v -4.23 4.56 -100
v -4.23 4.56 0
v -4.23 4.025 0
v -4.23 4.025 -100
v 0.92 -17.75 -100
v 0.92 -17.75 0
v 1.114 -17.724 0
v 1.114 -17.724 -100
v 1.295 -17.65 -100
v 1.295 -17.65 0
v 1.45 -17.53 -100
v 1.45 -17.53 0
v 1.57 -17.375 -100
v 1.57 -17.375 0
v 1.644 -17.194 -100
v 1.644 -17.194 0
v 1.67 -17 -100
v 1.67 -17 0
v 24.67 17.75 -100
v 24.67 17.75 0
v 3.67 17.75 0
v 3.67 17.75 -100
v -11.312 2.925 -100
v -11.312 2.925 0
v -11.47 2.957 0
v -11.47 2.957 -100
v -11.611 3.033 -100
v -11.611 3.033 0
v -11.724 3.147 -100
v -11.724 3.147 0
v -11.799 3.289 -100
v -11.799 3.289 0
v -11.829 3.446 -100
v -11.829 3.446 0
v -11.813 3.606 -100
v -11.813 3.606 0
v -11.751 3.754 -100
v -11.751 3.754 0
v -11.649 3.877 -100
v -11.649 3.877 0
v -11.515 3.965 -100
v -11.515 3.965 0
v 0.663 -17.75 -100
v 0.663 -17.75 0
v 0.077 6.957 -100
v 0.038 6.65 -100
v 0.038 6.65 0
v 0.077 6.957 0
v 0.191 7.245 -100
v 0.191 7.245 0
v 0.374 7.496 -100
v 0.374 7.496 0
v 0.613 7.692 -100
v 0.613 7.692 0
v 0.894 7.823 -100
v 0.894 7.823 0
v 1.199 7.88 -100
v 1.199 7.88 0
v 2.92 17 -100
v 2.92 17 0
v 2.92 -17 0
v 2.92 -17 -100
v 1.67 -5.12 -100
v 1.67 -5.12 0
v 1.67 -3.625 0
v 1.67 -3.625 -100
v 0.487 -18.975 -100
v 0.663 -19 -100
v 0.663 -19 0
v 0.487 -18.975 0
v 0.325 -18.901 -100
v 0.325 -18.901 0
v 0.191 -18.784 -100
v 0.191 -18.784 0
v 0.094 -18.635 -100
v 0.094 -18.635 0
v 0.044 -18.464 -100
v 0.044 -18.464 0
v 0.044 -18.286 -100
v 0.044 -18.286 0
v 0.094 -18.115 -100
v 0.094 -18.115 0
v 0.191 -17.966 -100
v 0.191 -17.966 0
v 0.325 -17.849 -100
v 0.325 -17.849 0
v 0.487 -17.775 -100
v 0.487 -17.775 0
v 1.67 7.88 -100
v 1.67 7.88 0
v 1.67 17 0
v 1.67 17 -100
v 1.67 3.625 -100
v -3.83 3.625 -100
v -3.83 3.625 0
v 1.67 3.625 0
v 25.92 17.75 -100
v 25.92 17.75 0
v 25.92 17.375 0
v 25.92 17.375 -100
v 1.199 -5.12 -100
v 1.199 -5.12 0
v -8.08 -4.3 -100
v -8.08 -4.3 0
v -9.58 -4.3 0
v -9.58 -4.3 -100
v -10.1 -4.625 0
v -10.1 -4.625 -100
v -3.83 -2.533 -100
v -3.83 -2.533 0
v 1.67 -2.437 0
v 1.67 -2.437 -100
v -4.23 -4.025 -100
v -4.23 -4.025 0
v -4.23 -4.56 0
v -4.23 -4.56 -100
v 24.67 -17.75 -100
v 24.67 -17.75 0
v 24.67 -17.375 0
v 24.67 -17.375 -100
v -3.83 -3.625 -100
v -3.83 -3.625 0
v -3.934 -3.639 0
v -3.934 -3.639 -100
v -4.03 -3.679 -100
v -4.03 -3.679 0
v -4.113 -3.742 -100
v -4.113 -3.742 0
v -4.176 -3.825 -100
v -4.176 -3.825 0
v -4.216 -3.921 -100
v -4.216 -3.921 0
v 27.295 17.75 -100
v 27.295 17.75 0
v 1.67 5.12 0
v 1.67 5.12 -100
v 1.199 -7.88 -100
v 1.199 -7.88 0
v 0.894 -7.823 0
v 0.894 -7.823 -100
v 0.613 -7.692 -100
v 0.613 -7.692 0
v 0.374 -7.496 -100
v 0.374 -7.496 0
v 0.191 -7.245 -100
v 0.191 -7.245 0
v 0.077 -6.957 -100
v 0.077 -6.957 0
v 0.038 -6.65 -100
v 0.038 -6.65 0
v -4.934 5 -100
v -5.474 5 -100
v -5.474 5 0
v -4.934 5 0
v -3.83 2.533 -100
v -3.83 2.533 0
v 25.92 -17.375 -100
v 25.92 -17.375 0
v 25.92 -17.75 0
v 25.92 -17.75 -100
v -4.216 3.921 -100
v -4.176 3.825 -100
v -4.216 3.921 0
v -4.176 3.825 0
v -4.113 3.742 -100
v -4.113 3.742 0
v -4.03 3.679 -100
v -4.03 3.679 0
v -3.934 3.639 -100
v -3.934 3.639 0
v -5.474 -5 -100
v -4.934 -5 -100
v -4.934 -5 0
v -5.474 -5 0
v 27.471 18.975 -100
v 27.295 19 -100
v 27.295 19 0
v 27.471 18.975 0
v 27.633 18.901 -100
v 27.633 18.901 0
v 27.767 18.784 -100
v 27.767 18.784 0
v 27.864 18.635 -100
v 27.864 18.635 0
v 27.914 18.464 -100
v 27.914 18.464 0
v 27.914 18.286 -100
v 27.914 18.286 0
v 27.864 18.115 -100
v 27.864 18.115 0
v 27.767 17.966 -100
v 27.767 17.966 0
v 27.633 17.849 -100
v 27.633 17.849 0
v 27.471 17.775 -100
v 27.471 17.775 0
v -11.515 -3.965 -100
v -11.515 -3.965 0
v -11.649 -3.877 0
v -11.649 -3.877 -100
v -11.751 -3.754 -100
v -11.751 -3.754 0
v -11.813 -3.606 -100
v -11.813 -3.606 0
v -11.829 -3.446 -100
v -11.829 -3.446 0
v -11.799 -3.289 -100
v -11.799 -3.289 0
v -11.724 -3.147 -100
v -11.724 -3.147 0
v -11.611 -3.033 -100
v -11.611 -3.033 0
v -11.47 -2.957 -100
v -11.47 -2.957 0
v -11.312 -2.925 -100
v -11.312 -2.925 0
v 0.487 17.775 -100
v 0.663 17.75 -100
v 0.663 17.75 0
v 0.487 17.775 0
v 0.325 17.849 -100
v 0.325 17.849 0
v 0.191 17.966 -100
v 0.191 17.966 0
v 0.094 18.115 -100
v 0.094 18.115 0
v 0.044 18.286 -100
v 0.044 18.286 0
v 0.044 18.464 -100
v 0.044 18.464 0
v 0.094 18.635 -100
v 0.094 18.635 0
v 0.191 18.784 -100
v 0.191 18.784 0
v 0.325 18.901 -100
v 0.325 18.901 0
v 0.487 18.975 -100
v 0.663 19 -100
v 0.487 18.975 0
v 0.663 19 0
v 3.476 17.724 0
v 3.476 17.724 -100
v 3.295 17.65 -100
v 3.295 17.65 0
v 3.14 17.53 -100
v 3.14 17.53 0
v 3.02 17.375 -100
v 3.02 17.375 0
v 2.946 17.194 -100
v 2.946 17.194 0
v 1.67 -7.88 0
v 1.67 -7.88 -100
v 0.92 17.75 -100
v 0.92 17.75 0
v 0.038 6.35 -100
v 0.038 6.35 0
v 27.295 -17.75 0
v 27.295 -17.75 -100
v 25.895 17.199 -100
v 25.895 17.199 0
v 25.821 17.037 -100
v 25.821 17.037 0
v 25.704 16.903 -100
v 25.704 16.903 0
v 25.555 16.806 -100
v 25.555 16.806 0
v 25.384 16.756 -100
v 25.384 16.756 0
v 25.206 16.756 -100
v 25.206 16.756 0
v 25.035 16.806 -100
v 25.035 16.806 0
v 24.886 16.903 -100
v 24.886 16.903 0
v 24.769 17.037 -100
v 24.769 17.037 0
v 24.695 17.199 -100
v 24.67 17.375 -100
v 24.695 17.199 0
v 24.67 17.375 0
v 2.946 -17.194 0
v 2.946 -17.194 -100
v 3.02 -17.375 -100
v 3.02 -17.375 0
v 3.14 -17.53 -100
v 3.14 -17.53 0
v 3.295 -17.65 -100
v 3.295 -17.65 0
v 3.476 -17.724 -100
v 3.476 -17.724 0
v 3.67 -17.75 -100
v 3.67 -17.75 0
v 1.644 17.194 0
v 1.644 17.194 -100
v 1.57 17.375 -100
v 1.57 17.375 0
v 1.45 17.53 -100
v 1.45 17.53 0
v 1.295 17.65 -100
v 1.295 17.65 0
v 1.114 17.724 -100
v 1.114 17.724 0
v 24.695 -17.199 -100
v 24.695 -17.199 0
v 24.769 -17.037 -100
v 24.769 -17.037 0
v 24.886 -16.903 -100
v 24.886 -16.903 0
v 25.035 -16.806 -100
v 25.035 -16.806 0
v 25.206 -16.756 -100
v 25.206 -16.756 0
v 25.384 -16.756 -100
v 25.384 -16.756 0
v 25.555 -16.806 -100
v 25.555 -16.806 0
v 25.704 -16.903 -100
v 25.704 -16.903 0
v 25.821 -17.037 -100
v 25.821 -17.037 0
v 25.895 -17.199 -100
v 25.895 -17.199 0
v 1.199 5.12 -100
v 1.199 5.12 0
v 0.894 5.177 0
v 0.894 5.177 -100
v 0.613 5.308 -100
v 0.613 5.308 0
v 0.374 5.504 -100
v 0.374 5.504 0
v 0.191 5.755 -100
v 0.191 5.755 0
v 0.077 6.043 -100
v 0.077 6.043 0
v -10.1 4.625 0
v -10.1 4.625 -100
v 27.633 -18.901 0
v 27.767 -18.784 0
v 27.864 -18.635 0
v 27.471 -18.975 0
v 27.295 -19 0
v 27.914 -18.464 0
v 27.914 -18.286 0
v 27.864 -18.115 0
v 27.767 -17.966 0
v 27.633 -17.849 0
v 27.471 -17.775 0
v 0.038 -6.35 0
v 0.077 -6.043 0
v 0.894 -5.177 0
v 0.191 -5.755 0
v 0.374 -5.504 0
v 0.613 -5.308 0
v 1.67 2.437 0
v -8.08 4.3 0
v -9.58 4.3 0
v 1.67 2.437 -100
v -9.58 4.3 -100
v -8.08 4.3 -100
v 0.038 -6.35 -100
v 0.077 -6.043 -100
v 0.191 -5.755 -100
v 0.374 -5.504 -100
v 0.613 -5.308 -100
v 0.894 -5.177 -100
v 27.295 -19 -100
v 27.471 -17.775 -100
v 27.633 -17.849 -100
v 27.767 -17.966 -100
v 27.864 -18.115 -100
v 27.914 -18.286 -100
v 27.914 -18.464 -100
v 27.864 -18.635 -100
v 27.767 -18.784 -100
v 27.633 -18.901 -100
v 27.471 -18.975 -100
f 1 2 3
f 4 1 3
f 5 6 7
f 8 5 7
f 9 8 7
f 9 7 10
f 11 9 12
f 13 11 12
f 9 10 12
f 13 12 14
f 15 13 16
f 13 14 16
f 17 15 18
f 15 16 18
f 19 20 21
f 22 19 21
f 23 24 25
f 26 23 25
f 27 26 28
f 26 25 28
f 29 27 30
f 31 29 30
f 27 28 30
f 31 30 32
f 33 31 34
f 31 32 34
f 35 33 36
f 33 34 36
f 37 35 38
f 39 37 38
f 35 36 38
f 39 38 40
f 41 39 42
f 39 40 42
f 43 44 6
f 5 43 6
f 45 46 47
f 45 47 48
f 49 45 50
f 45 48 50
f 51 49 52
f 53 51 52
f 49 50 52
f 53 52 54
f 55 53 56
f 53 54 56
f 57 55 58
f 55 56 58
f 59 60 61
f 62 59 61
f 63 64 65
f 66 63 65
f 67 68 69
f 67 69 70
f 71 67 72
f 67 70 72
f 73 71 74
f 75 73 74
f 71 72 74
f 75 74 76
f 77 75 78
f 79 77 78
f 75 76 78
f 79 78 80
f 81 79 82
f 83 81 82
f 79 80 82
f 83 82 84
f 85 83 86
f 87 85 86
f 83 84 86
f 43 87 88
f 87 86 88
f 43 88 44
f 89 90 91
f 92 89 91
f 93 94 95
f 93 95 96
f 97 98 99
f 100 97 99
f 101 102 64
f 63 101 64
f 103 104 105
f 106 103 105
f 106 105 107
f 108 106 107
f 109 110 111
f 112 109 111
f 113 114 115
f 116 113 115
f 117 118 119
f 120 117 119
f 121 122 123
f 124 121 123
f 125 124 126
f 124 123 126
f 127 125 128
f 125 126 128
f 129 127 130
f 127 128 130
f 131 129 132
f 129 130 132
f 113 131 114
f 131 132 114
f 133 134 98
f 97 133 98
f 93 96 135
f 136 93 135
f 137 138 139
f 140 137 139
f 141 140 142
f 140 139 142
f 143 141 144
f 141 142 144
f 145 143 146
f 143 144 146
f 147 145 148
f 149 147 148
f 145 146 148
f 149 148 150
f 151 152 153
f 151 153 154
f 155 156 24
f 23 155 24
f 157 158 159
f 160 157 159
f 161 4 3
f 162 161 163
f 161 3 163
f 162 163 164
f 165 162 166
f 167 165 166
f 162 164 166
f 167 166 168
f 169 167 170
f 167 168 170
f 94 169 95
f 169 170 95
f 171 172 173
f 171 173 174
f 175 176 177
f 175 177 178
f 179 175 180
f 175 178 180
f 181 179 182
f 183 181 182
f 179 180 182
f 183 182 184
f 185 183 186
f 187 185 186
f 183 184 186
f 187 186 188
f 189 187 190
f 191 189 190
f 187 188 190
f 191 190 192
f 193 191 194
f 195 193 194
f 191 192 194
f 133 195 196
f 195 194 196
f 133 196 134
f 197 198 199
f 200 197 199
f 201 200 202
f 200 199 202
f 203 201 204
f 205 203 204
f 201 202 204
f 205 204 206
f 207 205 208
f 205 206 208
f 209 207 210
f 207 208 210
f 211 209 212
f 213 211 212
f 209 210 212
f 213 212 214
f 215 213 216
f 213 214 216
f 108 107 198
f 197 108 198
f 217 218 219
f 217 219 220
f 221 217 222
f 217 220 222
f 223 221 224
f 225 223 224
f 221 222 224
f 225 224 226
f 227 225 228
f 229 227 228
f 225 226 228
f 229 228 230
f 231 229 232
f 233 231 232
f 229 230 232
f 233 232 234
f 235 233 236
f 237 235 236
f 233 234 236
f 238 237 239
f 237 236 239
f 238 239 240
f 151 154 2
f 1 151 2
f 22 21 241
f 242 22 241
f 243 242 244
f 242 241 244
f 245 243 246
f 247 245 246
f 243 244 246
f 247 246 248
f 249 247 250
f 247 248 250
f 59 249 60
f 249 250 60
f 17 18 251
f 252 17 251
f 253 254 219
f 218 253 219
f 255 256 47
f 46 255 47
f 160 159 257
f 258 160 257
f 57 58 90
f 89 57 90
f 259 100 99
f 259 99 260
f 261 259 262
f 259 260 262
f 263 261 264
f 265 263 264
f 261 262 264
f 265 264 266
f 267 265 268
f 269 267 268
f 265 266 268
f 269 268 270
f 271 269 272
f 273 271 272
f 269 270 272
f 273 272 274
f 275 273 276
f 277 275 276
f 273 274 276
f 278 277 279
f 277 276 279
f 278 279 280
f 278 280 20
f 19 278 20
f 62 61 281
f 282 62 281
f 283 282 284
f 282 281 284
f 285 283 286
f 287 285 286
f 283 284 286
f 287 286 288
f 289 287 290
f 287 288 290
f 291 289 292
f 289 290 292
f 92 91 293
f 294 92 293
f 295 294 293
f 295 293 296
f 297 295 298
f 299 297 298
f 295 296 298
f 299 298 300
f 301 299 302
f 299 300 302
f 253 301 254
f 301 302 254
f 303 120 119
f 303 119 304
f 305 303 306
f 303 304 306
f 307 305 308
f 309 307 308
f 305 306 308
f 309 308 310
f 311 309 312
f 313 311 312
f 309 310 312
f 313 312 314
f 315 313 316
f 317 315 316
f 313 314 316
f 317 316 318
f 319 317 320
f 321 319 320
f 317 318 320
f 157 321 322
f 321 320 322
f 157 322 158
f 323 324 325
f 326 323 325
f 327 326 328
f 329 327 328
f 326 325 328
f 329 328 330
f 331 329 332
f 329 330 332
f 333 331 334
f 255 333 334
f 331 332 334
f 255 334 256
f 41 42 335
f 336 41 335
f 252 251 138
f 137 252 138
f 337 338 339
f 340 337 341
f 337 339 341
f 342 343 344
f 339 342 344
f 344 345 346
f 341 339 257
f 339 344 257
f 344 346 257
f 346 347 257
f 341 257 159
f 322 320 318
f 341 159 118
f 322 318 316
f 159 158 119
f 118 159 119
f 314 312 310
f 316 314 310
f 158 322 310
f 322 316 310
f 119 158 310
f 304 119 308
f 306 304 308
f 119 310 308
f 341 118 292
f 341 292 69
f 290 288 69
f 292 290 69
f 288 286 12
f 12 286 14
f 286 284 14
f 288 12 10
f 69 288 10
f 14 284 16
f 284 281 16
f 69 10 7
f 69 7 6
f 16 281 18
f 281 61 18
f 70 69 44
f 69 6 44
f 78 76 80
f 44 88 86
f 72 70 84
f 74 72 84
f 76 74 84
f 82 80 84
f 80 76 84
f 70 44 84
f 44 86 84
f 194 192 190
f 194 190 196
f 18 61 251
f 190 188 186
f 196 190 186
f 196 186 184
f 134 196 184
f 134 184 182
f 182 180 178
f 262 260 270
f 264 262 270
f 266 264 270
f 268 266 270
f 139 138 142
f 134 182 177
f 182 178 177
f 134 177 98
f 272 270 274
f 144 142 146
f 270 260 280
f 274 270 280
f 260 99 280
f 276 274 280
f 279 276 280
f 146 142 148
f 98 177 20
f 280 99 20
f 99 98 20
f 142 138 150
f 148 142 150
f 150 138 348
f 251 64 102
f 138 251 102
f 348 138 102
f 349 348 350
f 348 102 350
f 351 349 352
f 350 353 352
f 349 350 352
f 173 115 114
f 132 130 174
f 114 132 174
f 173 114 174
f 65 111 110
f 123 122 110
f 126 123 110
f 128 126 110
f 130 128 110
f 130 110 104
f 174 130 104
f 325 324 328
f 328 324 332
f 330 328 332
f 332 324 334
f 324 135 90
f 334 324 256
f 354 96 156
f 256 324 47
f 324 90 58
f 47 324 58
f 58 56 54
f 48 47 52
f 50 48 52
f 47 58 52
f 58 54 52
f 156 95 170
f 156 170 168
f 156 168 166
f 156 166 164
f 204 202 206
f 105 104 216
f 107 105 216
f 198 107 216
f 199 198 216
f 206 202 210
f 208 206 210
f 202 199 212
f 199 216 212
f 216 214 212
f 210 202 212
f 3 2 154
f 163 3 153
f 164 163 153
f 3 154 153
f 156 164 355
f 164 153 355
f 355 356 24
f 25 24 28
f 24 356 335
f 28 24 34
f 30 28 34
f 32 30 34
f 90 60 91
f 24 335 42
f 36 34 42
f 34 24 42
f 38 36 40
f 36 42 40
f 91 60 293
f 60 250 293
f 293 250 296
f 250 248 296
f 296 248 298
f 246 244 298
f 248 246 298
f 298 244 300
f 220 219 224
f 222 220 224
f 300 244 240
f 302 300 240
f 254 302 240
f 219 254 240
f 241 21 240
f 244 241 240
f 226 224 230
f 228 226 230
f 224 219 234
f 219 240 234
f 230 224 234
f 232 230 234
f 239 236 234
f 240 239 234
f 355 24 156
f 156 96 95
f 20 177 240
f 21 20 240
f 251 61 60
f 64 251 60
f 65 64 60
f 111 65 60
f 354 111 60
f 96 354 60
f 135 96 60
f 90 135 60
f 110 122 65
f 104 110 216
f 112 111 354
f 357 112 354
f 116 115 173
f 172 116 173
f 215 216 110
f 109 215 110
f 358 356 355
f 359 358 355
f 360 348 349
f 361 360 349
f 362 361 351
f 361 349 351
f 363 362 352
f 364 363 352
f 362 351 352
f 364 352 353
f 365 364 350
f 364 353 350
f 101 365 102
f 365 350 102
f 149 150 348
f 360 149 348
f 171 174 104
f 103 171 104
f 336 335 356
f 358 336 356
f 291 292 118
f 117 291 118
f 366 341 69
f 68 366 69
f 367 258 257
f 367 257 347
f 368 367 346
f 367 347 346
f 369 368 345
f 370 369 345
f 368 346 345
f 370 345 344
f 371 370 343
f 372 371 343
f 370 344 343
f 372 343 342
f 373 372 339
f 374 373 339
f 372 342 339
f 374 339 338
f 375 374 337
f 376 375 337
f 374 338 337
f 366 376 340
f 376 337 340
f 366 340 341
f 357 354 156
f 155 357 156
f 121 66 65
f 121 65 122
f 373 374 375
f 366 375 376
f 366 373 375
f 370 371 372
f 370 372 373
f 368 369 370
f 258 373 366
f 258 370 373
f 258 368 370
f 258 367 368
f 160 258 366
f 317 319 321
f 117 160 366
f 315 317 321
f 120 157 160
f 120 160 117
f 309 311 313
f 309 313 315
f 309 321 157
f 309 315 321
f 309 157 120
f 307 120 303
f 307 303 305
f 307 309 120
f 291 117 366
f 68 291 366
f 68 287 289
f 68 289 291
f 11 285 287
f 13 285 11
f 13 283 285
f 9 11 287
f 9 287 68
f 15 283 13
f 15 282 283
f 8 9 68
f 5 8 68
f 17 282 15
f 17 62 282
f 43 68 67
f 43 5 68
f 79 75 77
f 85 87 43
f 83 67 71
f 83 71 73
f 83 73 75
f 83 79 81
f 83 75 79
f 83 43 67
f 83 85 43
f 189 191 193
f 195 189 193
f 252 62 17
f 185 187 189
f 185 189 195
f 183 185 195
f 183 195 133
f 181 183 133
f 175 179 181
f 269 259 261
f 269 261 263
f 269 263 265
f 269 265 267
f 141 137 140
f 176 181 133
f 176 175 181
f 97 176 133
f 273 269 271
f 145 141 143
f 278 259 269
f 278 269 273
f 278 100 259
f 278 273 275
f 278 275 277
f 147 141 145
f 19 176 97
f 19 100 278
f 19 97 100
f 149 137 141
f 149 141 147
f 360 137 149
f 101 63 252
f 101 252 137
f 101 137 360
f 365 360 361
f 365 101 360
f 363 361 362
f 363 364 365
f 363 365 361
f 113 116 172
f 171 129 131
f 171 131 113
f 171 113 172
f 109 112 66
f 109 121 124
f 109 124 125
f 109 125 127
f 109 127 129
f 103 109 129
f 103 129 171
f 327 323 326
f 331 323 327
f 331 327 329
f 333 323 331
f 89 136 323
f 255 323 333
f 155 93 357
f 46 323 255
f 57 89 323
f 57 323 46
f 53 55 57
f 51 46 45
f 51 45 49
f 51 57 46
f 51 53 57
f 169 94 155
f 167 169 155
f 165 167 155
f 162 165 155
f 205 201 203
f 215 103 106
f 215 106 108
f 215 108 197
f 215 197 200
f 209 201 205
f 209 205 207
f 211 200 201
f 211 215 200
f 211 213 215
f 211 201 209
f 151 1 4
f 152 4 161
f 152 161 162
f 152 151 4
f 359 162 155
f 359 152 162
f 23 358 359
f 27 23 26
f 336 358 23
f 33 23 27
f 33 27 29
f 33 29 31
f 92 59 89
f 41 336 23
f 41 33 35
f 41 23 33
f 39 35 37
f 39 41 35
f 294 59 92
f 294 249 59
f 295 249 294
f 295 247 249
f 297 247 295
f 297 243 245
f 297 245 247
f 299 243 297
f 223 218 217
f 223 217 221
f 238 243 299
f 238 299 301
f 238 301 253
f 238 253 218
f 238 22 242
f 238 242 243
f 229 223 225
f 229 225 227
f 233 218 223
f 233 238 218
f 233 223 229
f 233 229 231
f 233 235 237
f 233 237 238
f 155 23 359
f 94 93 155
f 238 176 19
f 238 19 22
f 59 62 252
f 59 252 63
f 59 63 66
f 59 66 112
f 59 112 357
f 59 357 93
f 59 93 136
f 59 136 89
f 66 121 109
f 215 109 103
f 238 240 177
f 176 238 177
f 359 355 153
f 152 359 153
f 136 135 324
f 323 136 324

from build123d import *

# Parameters (mm, degrees)
MAIN_EXTRUSION_DEPTH = 100


with BuildPart() as part:
    # Sk Main Extrusion → Main Extrusion (new body)
    with BuildSketch(Plane.XY):
        with BuildLine():
            Line((-3.83, 2.5328), (-11.31249103, 2.925083334))
            ThreePointArc((-11.31249103, 2.925083334), (-11.819967595, 3.366238681), (-11.514691833, 3.965369062))
            Line((-11.514691833, 3.965369062), (-10.100108722, 4.625))
            Line((-10.100108722, 4.625), (-9.58, 4.3))
            Line((-9.58, 4.3), (-8.08, 4.3))
            Line((-8.08, 4.3), (-5.474147193, 5))
            Line((-5.474147193, 5), (-4.934147193, 5))
            Line((-4.934147193, 5), (-4.23, 4.56))
            Line((-4.23, 4.56), (-4.23, 4.025))
            ThreePointArc((-4.23, 4.025), (-4.112842694, 3.742157269), (-3.829999948, 3.625))
            Line((-3.829999948, 3.625), (1.67, 3.625))
            Line((1.67, 3.625), (1.67, 5.120055168))
            Line((1.67, 5.120055168), (1.19886836, 5.120055168))
            ThreePointArc((1.19886836, 5.120055168), (0.3740485, 5.504367154), (0.038, 6.35))
            Line((0.038, 6.35), (0.038, 6.65))
            ThreePointArc((0.038, 6.65), (0.3740485, 7.495632846), (1.19886836, 7.879944832))
            Line((1.19886836, 7.879944832), (1.67, 7.879944832))
            Line((1.67, 7.879944832), (1.67, 17))
            ThreePointArc((1.67, 17), (1.450330086, 17.530330086), (0.92, 17.75))
            Line((0.92, 17.75), (0.663, 17.75))
            ThreePointArc((0.663, 17.75), (0.038, 18.375), (0.663, 19))
            Line((0.663, 19), (27.295, 19))
            ThreePointArc((27.295, 19), (27.92, 18.375), (27.295, 17.75))
            Line((27.295, 17.75), (25.92, 17.75))
            Line((25.92, 17.75), (25.92, 17.375))
            ThreePointArc((25.92, 17.375), (25.295, 16.75), (24.67, 17.375))
            Line((24.67, 17.375), (24.67, 17.75))
            Line((24.67, 17.75), (3.67, 17.75))
            ThreePointArc((3.67, 17.75), (3.139669914, 17.530330086), (2.92, 17))
            Line((2.92, 17), (2.92, -17))
            ThreePointArc((2.92, -17), (3.139669914, -17.530330086), (3.67, -17.75))
            Line((3.67, -17.75), (24.67, -17.75))
            Line((24.67, -17.75), (24.67, -17.375))
            ThreePointArc((24.67, -17.375), (25.295, -16.75), (25.92, -17.375))
            Line((25.92, -17.375), (25.92, -17.75))
            Line((25.92, -17.75), (27.295, -17.75))
            ThreePointArc((27.295, -17.75), (27.92, -18.375), (27.295, -19))
            Line((27.295, -19), (0.663, -19))
            ThreePointArc((0.663, -19), (0.038, -18.375), (0.663, -17.75))
            Line((0.663, -17.75), (0.92, -17.75))
            ThreePointArc((0.92, -17.75), (1.450330086, -17.530330086), (1.67, -17))
            Line((1.67, -17), (1.67, -7.879944832))
            Line((1.67, -7.879944832), (1.19886836, -7.879944832))
            ThreePointArc((1.19886836, -7.879944832), (0.374048509, -7.495632855), (0.038, -6.650000026))
            Line((0.038, -6.650000026), (0.038, -6.350000026))
            ThreePointArc((0.038, -6.350000026), (0.374048491, -5.504367164), (1.19886836, -5.120055168))
            Line((1.19886836, -5.120055168), (1.67, -5.120055168))
            Line((1.67, -5.120055168), (1.67, -3.625))
            Line((1.67, -3.625), (-3.829999948, -3.625))
            ThreePointArc((-3.829999948, -3.625), (-4.112842694, -3.742157269), (-4.23, -4.025))
            Line((-4.23, -4.025), (-4.23, -4.56))
            Line((-4.23, -4.56), (-4.934147193, -5))
            Line((-4.934147193, -5), (-5.474147193, -5))
            Line((-5.474147193, -5), (-8.08, -4.3))
            Line((-8.08, -4.3), (-9.58, -4.3))
            Line((-9.58, -4.3), (-10.100108722, -4.625))
            Line((-10.100108722, -4.625), (-11.514691833, -3.965369062))
            ThreePointArc((-11.514691833, -3.965369062), (-11.819967595, -3.366238681), (-11.31249103, -2.925083334))
            Line((-11.31249103, -2.925083334), (-3.83, -2.5328))
            Line((-3.83, -2.5328), (1.67, -2.436797143))
            Line((1.67, -2.436797143), (1.67, 2.436797143))
            Line((1.67, 2.436797143), (-3.83, 2.5328))
        make_face()
    extrude(amount=-MAIN_EXTRUSION_DEPTH)


solid = part.part
